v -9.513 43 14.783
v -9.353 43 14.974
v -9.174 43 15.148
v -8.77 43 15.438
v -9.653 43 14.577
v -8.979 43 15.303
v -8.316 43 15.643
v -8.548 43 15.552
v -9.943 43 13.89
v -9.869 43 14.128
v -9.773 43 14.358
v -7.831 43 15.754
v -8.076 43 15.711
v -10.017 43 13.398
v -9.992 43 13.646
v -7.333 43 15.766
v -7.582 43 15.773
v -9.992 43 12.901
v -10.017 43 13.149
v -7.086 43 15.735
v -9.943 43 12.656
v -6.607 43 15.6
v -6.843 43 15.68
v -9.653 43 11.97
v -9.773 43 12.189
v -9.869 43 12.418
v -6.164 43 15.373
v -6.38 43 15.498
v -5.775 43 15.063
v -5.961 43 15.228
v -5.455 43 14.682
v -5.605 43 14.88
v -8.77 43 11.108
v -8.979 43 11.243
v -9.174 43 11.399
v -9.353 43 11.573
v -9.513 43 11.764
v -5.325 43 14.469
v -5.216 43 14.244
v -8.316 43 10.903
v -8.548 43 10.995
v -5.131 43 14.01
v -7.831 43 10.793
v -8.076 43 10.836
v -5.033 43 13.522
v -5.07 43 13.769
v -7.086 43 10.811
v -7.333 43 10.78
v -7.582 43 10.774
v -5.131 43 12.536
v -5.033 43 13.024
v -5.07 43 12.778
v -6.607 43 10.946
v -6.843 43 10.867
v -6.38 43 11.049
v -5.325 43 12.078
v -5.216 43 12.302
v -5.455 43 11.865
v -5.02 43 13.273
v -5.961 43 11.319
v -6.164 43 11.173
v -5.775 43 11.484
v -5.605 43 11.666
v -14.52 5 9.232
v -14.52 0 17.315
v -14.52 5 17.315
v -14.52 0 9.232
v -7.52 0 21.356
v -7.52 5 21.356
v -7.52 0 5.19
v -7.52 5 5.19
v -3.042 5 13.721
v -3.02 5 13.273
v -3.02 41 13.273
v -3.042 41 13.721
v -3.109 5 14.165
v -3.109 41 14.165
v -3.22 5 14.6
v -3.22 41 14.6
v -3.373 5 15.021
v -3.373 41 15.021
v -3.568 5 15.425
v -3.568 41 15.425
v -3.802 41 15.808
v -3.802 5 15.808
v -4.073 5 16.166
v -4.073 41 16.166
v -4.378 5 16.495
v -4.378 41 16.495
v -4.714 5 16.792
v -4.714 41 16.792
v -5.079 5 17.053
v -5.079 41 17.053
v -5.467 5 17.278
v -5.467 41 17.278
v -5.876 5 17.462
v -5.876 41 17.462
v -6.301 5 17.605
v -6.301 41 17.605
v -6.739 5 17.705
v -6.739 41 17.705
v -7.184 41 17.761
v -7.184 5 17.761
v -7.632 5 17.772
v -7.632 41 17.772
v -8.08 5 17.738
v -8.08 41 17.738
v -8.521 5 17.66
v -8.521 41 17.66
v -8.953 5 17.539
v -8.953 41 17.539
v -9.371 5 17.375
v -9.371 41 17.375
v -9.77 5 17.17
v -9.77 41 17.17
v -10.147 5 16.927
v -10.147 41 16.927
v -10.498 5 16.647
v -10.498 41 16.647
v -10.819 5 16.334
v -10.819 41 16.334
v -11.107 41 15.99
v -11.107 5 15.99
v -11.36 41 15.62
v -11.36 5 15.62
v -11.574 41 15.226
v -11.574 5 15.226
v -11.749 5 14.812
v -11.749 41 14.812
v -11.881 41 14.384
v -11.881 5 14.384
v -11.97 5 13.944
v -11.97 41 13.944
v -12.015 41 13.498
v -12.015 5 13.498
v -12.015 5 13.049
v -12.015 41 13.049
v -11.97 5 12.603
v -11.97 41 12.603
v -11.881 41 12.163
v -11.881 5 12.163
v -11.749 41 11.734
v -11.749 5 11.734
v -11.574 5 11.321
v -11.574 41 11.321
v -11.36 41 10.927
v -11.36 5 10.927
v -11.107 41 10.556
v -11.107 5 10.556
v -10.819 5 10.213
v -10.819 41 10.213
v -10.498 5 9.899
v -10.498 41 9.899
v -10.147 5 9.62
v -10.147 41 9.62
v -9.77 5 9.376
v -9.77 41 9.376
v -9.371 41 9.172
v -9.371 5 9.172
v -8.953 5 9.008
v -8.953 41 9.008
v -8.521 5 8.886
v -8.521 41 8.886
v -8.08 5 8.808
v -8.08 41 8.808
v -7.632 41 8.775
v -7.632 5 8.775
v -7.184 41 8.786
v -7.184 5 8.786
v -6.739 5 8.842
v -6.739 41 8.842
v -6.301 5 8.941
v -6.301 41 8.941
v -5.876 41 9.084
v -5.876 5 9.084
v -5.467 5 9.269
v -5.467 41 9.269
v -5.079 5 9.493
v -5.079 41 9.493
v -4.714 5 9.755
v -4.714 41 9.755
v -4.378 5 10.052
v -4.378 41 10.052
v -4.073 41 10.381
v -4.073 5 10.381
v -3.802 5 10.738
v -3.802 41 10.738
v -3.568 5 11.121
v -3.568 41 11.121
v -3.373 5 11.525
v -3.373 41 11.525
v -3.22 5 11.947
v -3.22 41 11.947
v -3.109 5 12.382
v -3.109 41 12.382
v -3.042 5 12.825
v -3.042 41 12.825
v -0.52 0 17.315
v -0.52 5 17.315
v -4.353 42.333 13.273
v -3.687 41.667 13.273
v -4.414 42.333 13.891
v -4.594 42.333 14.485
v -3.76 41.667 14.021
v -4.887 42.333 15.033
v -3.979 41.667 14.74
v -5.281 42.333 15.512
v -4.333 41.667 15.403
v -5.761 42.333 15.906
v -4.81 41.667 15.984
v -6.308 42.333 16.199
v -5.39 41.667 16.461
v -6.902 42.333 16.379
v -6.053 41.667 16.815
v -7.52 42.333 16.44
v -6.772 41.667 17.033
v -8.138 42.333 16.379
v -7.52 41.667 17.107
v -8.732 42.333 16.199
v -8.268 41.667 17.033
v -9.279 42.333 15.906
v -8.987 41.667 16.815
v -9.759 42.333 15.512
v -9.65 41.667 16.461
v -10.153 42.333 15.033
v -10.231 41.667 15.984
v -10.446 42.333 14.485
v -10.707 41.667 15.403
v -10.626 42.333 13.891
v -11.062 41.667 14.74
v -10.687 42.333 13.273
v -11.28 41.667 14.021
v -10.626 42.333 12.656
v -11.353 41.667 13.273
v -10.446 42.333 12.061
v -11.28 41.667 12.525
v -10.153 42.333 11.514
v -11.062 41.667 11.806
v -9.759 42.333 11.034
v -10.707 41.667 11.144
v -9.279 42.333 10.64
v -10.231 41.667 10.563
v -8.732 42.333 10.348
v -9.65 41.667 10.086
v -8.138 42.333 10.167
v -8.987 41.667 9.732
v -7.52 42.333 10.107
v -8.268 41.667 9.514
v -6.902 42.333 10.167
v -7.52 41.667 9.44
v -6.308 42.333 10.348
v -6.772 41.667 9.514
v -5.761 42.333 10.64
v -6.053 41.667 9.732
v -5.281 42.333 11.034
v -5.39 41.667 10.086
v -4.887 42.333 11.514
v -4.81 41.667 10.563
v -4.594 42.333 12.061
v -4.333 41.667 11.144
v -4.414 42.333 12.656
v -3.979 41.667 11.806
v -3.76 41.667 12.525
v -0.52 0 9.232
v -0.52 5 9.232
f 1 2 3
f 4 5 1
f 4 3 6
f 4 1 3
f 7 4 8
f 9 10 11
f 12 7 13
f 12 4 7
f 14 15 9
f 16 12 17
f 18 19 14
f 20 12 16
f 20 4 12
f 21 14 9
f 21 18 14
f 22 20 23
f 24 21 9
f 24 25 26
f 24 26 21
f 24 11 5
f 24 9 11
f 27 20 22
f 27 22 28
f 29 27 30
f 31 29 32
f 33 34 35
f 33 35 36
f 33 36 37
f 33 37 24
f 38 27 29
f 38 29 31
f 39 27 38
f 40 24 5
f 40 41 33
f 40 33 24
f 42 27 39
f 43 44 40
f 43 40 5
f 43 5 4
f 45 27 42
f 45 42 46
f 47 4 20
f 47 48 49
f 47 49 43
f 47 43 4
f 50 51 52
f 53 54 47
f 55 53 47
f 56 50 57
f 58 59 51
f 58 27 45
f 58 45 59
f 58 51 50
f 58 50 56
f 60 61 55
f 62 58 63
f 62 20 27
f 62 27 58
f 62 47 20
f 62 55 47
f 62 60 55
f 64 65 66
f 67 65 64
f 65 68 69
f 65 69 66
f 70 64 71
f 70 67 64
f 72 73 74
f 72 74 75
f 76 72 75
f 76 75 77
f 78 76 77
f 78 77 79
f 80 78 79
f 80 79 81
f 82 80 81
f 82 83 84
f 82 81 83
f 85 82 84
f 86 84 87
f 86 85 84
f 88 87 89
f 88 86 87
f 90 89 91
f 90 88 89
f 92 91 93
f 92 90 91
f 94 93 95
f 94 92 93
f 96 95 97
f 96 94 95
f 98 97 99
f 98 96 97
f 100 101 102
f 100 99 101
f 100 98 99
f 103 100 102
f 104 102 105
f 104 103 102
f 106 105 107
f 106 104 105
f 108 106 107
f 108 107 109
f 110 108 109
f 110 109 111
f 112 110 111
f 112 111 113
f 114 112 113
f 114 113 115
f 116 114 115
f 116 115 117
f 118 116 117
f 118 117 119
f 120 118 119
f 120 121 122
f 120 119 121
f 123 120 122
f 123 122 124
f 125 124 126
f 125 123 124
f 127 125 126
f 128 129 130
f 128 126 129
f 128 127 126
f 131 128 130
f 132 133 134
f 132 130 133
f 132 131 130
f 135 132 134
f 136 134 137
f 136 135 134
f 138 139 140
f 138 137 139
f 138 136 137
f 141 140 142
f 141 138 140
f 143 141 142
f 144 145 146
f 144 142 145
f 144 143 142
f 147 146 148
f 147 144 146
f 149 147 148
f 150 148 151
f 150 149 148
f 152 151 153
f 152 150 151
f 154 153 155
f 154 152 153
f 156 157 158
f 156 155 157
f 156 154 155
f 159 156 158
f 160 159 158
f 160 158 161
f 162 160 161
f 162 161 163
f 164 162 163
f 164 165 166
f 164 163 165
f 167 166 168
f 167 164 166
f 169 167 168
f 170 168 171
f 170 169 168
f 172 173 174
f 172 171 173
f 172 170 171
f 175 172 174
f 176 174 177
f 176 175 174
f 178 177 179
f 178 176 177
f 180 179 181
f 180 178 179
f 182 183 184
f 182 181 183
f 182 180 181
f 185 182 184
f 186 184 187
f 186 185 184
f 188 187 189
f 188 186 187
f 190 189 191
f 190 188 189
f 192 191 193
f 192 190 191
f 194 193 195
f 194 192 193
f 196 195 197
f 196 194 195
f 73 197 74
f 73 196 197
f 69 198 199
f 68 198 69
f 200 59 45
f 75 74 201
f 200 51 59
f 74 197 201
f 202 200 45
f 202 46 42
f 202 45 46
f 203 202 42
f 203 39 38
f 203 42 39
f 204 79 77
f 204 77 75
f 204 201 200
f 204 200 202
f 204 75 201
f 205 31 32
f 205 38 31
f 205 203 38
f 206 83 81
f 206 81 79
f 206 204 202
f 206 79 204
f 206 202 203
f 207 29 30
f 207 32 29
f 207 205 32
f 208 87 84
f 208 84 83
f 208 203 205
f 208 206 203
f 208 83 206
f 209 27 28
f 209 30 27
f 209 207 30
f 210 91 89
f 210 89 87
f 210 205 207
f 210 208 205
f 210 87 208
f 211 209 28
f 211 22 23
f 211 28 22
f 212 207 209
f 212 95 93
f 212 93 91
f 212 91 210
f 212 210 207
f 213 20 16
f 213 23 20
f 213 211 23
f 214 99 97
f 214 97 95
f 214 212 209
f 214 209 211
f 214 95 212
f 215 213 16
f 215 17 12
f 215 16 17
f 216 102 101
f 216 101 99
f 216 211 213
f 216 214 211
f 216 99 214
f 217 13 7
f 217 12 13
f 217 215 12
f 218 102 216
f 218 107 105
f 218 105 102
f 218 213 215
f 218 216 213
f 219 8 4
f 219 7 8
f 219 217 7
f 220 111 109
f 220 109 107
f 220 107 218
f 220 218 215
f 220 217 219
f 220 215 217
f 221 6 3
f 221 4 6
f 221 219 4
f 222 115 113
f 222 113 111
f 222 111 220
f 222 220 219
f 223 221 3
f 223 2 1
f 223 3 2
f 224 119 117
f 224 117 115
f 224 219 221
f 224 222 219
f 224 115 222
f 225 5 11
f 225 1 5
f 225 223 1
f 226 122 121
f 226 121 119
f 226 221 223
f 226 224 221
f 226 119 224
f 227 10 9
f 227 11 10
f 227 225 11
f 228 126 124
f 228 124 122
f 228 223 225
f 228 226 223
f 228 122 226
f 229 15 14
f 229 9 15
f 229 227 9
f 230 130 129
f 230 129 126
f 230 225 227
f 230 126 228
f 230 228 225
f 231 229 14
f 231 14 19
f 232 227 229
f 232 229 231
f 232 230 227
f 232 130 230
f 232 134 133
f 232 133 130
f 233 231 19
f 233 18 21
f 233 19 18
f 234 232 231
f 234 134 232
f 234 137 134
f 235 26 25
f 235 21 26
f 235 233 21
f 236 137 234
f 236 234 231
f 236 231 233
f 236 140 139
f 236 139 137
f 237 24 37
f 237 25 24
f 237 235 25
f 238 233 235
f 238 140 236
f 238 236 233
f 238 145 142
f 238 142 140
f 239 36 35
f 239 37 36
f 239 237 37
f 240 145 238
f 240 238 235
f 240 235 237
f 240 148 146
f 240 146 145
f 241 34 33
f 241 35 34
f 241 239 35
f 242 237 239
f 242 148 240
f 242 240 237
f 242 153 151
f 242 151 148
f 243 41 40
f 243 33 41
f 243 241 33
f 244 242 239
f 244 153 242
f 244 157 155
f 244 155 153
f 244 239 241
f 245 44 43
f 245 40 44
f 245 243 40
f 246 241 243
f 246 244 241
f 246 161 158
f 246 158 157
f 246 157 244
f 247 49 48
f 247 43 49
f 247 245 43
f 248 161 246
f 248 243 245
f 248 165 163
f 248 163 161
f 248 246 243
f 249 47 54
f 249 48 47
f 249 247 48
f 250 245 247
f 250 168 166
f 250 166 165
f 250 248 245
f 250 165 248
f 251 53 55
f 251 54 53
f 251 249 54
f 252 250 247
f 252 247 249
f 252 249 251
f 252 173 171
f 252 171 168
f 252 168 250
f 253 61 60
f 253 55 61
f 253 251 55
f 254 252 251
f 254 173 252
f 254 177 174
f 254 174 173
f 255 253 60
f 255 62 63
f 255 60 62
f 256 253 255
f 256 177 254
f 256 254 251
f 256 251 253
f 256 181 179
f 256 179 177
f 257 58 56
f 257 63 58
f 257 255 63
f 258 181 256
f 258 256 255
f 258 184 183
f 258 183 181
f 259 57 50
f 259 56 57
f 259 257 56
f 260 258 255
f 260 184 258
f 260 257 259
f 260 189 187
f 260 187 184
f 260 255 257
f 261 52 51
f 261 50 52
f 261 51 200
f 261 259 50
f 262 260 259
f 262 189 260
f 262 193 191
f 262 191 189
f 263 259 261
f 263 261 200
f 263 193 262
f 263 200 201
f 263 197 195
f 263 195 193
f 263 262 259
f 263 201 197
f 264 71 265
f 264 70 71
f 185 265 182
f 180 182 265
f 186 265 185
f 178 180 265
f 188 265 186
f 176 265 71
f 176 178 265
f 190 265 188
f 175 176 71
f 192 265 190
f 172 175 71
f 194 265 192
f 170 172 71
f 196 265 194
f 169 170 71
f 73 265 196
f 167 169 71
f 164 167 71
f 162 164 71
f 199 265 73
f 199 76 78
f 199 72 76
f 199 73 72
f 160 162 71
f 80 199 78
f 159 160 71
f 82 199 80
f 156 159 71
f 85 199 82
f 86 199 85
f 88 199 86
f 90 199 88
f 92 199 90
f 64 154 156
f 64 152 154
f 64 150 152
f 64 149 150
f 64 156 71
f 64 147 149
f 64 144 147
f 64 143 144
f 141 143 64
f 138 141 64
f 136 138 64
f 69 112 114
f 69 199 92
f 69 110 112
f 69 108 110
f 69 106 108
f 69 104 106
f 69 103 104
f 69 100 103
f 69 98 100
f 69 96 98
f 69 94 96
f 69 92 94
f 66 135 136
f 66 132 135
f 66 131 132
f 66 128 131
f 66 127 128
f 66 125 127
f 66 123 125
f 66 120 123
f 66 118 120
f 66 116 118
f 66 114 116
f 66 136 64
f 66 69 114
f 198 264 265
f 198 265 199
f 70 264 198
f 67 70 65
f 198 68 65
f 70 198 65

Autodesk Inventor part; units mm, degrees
ref_plane "YZ Plane" through (0, 0, 0) normal (1, 0, 0) x (0, 1, 0)
ref_plane "XZ Plane" through (0, 0, 0) normal (0, 1, 0) x (-1, 0, 0)
ref_plane "XY Plane" through (0, 0, 0) normal (0, 0, 1) x (1, 0, 0)
sketch "Sketch1" plane through (0, 0, 0) normal (0, 1, 0) x (-1, 0, 0)
  line L0 (7.5201, 21.3562) -> (14.5201, 17.3147)
  line L1 (14.5201, 17.3147) -> (14.5201, 9.2318)
  line L2 (14.5201, 9.2318) -> (7.5201, 5.1904)
  line L3 (7.5201, 5.1904) -> (0.5201, 9.2318)
  line L4 (0.5201, 9.2318) -> (0.5201, 17.3147)
  line L5 (0.5201, 17.3147) -> (7.5201, 21.3562)
  point P0 (7.5201, 13.2733)
  dimension "d0" = 14
extrude "Extrusion1" add sketch "Sketch1" along normal blind 5
sketch "Sketch2" plane through (0, 5, 0) normal (0, 1, 0) x (1, 0, 0)
  line L0 (-14.5201, -17.3147) -> (-7.5201, -21.3562) projected
  line L1 (-7.5201, -21.3562) -> (-0.5201, -17.3147) projected
  line L2 (-0.5201, -17.3147) -> (-0.5201, -9.2318) projected
  line L3 (-0.5201, -9.2318) -> (-7.5201, -5.1904) projected
  line L4 (-7.5201, -5.1904) -> (-14.5201, -9.2318) projected
  line L5 (-14.5201, -9.2318) -> (-14.5201, -17.3147) projected
  line L6 (-14.5201, -13.2733) -> (-0.5201, -13.2733) construction
  circle A0 centre (-7.5201, -13.2733) radius 4.5
  dimension "d3" = 9
extrude "Extrusion2" add sketch "Sketch2" along normal blind 38 contours A0
chamfer "Chamfer1" distance 2 angle 45 1 edges at (-12.0201, 43, 13.2733)
properties part number "perno_38"
